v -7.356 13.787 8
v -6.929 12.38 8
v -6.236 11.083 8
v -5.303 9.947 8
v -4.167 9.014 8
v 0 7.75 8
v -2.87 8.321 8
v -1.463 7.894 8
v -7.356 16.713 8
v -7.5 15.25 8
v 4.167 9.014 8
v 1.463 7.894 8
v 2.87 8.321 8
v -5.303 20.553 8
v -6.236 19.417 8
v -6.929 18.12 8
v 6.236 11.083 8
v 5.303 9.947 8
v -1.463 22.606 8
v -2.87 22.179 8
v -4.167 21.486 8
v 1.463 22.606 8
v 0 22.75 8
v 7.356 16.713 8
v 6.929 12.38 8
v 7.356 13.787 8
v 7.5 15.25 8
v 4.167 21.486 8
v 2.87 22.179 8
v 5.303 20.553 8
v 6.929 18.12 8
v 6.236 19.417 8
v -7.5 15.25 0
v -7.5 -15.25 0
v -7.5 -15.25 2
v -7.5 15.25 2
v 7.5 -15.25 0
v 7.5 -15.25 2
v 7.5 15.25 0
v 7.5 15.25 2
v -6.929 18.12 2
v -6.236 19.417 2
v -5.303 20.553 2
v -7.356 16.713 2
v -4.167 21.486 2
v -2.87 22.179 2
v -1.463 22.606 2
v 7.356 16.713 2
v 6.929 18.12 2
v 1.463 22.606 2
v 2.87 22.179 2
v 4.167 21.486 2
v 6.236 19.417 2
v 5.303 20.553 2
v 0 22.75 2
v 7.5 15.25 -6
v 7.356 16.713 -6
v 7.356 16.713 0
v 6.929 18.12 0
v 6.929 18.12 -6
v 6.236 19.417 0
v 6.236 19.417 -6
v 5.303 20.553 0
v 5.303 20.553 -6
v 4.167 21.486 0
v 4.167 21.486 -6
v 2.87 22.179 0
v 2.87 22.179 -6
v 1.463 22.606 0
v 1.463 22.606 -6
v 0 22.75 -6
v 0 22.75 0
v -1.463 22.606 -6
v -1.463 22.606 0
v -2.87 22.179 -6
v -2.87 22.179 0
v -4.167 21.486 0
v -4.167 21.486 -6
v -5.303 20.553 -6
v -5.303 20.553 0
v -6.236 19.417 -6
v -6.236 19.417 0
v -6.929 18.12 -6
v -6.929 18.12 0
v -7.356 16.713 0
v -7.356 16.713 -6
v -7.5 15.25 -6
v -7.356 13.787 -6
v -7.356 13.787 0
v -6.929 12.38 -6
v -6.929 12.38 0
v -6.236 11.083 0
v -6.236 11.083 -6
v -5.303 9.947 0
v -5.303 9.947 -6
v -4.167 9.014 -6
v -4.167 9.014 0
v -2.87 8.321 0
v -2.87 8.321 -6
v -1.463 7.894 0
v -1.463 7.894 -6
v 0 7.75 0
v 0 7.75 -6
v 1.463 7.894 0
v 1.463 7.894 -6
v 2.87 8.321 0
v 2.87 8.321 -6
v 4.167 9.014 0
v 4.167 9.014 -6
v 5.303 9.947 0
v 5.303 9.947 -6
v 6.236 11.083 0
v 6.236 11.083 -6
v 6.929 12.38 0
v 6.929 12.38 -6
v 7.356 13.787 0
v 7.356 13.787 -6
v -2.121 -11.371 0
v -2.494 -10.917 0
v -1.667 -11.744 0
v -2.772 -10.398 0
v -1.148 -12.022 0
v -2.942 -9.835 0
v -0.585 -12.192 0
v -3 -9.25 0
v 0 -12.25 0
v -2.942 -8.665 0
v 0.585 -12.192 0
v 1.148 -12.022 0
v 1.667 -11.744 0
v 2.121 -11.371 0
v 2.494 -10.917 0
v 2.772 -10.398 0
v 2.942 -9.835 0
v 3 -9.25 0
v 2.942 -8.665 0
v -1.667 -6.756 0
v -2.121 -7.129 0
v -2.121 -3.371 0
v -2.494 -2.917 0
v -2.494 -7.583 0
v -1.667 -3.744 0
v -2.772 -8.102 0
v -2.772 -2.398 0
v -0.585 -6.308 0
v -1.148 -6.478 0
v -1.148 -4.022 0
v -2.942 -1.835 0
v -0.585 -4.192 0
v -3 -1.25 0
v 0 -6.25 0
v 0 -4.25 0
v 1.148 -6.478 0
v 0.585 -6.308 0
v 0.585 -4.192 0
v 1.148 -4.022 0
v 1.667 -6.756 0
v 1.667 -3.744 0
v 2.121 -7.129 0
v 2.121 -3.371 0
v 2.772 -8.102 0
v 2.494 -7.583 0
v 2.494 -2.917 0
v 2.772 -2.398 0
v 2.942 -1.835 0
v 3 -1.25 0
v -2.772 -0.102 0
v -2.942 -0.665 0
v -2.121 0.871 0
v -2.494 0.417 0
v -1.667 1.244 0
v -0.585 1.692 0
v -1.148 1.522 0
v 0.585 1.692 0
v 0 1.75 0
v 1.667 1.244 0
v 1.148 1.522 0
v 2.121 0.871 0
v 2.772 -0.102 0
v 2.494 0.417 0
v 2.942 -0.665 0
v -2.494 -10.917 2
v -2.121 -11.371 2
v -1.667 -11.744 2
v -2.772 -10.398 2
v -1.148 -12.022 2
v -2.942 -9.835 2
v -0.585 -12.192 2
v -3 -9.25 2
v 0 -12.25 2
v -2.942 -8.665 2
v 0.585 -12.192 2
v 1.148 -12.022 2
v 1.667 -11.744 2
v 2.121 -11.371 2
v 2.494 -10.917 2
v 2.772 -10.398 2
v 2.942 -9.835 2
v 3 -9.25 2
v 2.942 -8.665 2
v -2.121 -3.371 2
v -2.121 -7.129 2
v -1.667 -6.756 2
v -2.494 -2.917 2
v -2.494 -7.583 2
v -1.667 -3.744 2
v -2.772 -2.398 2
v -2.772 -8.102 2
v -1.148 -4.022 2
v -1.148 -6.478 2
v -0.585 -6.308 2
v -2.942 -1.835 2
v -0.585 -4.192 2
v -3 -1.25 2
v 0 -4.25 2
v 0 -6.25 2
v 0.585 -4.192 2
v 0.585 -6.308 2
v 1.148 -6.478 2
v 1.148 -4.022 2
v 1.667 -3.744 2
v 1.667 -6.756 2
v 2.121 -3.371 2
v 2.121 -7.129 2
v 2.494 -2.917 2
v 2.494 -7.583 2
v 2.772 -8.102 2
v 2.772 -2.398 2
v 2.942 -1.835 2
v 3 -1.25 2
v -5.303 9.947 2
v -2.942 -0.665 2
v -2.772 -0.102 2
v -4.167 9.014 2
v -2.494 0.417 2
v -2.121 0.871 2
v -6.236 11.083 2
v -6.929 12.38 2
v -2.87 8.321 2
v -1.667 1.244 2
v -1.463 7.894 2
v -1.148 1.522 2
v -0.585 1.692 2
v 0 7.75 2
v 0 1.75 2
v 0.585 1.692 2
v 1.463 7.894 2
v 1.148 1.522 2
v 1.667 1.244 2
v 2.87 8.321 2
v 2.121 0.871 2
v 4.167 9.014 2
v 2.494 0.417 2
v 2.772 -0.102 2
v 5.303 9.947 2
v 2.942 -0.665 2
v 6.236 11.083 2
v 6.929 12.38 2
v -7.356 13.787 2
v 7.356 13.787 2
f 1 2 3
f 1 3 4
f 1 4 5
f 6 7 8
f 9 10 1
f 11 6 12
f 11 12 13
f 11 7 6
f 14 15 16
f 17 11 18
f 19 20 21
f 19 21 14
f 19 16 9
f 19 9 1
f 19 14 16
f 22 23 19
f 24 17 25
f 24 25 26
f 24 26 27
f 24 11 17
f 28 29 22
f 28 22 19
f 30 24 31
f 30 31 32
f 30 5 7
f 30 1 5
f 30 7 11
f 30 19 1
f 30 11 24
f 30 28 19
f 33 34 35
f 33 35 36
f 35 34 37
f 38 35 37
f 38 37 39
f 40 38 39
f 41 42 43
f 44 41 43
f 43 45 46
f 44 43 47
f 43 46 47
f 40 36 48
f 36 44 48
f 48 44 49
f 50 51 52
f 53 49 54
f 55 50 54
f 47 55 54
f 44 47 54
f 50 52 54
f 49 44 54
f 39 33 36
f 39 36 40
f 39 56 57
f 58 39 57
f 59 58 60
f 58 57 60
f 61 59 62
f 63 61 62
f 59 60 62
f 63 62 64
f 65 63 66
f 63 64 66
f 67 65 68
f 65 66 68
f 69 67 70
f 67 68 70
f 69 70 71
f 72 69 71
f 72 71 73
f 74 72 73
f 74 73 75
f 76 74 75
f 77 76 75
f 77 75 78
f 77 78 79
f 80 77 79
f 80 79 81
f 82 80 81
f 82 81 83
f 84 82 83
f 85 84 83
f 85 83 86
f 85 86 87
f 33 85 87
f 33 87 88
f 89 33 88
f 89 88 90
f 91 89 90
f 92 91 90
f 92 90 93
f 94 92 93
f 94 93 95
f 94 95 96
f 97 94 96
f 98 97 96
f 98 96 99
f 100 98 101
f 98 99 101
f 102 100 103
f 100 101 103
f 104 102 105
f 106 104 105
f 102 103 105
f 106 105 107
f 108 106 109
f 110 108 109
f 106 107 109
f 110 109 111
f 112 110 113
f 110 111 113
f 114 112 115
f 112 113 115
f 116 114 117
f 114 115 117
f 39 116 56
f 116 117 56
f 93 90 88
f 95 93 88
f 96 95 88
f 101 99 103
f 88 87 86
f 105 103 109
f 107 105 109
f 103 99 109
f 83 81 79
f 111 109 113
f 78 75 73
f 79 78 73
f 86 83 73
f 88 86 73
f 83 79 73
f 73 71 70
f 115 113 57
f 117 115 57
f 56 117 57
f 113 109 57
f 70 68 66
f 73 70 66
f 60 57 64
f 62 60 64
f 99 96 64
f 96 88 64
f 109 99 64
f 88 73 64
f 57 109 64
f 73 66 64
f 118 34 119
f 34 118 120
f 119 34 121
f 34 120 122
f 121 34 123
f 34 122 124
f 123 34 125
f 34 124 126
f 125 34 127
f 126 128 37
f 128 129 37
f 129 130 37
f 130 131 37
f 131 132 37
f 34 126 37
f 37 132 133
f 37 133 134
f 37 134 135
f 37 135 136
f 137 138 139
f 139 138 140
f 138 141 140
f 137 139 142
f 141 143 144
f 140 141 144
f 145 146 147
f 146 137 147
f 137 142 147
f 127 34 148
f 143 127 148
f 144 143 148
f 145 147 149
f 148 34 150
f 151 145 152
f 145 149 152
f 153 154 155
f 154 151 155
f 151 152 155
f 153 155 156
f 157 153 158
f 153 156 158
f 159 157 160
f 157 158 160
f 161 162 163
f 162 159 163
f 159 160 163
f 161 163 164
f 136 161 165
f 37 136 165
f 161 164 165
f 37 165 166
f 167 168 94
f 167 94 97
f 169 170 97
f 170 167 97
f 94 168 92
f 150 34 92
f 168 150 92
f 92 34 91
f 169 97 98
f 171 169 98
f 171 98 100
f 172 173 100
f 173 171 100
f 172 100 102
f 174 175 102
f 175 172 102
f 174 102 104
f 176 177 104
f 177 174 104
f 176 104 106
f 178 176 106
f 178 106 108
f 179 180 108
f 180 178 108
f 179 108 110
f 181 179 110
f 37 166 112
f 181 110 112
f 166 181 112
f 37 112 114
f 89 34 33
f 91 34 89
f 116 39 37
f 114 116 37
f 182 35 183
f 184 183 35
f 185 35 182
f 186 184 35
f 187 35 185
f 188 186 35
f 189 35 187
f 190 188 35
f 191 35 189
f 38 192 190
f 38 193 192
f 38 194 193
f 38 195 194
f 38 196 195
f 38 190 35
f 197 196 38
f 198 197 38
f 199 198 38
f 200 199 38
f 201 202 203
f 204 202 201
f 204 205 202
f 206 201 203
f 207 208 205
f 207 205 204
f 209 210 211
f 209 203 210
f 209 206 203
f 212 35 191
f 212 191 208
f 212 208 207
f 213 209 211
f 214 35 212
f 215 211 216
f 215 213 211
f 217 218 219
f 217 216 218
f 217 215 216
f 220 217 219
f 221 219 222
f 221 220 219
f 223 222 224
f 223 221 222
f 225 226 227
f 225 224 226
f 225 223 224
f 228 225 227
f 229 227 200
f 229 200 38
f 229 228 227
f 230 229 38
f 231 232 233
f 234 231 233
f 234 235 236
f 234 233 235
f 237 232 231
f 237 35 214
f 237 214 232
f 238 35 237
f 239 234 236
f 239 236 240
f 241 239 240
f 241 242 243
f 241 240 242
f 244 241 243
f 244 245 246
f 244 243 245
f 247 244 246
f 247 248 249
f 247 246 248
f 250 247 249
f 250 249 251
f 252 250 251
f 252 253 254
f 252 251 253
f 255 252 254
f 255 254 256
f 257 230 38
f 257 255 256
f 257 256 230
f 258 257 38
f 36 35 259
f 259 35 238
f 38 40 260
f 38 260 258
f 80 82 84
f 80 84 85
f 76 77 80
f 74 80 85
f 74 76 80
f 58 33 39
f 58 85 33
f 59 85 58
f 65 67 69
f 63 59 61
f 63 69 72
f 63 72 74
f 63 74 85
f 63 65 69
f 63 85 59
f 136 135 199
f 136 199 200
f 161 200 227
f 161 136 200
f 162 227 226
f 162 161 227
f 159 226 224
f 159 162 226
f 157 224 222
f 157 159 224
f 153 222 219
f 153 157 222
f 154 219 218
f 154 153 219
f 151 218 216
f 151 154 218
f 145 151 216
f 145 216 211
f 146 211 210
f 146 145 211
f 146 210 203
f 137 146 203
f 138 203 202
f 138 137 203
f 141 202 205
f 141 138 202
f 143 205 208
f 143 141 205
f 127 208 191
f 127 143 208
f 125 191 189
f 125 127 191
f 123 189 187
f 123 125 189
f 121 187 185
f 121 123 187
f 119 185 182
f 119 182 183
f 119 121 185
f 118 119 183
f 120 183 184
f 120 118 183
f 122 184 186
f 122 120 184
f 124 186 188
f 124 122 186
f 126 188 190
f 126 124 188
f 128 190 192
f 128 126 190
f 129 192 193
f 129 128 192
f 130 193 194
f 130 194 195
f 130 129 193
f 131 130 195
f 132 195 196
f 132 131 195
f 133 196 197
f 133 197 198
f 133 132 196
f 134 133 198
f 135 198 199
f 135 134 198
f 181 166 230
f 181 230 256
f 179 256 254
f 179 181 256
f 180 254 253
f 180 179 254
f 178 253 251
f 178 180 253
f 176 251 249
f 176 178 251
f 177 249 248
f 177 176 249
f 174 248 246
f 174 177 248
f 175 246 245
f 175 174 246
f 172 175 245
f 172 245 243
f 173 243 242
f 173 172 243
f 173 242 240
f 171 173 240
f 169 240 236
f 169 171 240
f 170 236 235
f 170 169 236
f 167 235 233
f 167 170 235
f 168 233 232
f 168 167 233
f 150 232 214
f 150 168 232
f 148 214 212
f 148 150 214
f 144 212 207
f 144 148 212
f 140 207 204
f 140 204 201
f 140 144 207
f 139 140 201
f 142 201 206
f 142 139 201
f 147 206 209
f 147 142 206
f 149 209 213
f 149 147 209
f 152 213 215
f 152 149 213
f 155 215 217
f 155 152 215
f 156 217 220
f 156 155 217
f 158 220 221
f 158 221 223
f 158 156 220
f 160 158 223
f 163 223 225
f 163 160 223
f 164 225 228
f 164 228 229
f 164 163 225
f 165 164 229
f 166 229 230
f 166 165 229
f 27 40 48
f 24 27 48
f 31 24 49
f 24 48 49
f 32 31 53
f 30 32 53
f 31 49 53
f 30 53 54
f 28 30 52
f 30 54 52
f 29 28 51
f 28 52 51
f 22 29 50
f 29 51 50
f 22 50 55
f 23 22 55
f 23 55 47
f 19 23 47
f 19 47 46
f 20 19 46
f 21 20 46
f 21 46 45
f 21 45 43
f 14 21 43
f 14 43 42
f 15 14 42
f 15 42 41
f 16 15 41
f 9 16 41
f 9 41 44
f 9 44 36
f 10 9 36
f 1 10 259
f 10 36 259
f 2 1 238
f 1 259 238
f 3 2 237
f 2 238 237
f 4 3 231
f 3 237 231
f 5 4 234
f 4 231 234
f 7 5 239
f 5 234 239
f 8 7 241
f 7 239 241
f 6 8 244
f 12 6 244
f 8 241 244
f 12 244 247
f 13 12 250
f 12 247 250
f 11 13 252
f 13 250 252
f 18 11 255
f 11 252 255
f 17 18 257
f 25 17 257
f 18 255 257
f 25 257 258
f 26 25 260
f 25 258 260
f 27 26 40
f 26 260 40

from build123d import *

# Parameters (mm, degrees)
SZKIC1_W                    = 15
SZKIC1_H                    = 30.5
SZKIC1_R                    = 3
DODANIE_WYCI_GNI_CIE1_DEPTH = 2
SZKIC2_R                    = 7.5
DODANIE_WYCI_GNI_CIE2_DEPTH = 6
DODANIE_WYCI_GNI_CIE3_START = -8
SZKIC2_2_R                  = 7.5
DODANIE_WYCI_GNI_CIE3_DEPTH = 6


with BuildPart() as part:
    # Szkic1 → Dodanie-wyciągnięcie1 (new body)
    with BuildSketch(Plane.XY):
        Rectangle(SZKIC1_W, SZKIC1_H)
        with Locations((0, -9.25)):
            Circle(SZKIC1_R, mode=Mode.SUBTRACT)
        with Locations((0, -1.25)):
            Circle(SZKIC1_R, mode=Mode.SUBTRACT)
    extrude(amount=DODANIE_WYCI_GNI_CIE1_DEPTH)

    # Szkic2 → Dodanie-wyciągnięcie2 (add)
    with BuildSketch(Plane.XY.offset(2)):
        with Locations((0, 15.25)):
            Circle(SZKIC2_R)
    extrude(amount=DODANIE_WYCI_GNI_CIE2_DEPTH)

    # Szkic2<2> → Dodanie-wyciągnięcie3 (add)
    with BuildSketch(Plane.XY.offset(2).offset(DODANIE_WYCI_GNI_CIE3_START)):
        with Locations((0, 15.25)):
            Circle(SZKIC2_2_R)
    extrude(amount=DODANIE_WYCI_GNI_CIE3_DEPTH)


solid = part.part
